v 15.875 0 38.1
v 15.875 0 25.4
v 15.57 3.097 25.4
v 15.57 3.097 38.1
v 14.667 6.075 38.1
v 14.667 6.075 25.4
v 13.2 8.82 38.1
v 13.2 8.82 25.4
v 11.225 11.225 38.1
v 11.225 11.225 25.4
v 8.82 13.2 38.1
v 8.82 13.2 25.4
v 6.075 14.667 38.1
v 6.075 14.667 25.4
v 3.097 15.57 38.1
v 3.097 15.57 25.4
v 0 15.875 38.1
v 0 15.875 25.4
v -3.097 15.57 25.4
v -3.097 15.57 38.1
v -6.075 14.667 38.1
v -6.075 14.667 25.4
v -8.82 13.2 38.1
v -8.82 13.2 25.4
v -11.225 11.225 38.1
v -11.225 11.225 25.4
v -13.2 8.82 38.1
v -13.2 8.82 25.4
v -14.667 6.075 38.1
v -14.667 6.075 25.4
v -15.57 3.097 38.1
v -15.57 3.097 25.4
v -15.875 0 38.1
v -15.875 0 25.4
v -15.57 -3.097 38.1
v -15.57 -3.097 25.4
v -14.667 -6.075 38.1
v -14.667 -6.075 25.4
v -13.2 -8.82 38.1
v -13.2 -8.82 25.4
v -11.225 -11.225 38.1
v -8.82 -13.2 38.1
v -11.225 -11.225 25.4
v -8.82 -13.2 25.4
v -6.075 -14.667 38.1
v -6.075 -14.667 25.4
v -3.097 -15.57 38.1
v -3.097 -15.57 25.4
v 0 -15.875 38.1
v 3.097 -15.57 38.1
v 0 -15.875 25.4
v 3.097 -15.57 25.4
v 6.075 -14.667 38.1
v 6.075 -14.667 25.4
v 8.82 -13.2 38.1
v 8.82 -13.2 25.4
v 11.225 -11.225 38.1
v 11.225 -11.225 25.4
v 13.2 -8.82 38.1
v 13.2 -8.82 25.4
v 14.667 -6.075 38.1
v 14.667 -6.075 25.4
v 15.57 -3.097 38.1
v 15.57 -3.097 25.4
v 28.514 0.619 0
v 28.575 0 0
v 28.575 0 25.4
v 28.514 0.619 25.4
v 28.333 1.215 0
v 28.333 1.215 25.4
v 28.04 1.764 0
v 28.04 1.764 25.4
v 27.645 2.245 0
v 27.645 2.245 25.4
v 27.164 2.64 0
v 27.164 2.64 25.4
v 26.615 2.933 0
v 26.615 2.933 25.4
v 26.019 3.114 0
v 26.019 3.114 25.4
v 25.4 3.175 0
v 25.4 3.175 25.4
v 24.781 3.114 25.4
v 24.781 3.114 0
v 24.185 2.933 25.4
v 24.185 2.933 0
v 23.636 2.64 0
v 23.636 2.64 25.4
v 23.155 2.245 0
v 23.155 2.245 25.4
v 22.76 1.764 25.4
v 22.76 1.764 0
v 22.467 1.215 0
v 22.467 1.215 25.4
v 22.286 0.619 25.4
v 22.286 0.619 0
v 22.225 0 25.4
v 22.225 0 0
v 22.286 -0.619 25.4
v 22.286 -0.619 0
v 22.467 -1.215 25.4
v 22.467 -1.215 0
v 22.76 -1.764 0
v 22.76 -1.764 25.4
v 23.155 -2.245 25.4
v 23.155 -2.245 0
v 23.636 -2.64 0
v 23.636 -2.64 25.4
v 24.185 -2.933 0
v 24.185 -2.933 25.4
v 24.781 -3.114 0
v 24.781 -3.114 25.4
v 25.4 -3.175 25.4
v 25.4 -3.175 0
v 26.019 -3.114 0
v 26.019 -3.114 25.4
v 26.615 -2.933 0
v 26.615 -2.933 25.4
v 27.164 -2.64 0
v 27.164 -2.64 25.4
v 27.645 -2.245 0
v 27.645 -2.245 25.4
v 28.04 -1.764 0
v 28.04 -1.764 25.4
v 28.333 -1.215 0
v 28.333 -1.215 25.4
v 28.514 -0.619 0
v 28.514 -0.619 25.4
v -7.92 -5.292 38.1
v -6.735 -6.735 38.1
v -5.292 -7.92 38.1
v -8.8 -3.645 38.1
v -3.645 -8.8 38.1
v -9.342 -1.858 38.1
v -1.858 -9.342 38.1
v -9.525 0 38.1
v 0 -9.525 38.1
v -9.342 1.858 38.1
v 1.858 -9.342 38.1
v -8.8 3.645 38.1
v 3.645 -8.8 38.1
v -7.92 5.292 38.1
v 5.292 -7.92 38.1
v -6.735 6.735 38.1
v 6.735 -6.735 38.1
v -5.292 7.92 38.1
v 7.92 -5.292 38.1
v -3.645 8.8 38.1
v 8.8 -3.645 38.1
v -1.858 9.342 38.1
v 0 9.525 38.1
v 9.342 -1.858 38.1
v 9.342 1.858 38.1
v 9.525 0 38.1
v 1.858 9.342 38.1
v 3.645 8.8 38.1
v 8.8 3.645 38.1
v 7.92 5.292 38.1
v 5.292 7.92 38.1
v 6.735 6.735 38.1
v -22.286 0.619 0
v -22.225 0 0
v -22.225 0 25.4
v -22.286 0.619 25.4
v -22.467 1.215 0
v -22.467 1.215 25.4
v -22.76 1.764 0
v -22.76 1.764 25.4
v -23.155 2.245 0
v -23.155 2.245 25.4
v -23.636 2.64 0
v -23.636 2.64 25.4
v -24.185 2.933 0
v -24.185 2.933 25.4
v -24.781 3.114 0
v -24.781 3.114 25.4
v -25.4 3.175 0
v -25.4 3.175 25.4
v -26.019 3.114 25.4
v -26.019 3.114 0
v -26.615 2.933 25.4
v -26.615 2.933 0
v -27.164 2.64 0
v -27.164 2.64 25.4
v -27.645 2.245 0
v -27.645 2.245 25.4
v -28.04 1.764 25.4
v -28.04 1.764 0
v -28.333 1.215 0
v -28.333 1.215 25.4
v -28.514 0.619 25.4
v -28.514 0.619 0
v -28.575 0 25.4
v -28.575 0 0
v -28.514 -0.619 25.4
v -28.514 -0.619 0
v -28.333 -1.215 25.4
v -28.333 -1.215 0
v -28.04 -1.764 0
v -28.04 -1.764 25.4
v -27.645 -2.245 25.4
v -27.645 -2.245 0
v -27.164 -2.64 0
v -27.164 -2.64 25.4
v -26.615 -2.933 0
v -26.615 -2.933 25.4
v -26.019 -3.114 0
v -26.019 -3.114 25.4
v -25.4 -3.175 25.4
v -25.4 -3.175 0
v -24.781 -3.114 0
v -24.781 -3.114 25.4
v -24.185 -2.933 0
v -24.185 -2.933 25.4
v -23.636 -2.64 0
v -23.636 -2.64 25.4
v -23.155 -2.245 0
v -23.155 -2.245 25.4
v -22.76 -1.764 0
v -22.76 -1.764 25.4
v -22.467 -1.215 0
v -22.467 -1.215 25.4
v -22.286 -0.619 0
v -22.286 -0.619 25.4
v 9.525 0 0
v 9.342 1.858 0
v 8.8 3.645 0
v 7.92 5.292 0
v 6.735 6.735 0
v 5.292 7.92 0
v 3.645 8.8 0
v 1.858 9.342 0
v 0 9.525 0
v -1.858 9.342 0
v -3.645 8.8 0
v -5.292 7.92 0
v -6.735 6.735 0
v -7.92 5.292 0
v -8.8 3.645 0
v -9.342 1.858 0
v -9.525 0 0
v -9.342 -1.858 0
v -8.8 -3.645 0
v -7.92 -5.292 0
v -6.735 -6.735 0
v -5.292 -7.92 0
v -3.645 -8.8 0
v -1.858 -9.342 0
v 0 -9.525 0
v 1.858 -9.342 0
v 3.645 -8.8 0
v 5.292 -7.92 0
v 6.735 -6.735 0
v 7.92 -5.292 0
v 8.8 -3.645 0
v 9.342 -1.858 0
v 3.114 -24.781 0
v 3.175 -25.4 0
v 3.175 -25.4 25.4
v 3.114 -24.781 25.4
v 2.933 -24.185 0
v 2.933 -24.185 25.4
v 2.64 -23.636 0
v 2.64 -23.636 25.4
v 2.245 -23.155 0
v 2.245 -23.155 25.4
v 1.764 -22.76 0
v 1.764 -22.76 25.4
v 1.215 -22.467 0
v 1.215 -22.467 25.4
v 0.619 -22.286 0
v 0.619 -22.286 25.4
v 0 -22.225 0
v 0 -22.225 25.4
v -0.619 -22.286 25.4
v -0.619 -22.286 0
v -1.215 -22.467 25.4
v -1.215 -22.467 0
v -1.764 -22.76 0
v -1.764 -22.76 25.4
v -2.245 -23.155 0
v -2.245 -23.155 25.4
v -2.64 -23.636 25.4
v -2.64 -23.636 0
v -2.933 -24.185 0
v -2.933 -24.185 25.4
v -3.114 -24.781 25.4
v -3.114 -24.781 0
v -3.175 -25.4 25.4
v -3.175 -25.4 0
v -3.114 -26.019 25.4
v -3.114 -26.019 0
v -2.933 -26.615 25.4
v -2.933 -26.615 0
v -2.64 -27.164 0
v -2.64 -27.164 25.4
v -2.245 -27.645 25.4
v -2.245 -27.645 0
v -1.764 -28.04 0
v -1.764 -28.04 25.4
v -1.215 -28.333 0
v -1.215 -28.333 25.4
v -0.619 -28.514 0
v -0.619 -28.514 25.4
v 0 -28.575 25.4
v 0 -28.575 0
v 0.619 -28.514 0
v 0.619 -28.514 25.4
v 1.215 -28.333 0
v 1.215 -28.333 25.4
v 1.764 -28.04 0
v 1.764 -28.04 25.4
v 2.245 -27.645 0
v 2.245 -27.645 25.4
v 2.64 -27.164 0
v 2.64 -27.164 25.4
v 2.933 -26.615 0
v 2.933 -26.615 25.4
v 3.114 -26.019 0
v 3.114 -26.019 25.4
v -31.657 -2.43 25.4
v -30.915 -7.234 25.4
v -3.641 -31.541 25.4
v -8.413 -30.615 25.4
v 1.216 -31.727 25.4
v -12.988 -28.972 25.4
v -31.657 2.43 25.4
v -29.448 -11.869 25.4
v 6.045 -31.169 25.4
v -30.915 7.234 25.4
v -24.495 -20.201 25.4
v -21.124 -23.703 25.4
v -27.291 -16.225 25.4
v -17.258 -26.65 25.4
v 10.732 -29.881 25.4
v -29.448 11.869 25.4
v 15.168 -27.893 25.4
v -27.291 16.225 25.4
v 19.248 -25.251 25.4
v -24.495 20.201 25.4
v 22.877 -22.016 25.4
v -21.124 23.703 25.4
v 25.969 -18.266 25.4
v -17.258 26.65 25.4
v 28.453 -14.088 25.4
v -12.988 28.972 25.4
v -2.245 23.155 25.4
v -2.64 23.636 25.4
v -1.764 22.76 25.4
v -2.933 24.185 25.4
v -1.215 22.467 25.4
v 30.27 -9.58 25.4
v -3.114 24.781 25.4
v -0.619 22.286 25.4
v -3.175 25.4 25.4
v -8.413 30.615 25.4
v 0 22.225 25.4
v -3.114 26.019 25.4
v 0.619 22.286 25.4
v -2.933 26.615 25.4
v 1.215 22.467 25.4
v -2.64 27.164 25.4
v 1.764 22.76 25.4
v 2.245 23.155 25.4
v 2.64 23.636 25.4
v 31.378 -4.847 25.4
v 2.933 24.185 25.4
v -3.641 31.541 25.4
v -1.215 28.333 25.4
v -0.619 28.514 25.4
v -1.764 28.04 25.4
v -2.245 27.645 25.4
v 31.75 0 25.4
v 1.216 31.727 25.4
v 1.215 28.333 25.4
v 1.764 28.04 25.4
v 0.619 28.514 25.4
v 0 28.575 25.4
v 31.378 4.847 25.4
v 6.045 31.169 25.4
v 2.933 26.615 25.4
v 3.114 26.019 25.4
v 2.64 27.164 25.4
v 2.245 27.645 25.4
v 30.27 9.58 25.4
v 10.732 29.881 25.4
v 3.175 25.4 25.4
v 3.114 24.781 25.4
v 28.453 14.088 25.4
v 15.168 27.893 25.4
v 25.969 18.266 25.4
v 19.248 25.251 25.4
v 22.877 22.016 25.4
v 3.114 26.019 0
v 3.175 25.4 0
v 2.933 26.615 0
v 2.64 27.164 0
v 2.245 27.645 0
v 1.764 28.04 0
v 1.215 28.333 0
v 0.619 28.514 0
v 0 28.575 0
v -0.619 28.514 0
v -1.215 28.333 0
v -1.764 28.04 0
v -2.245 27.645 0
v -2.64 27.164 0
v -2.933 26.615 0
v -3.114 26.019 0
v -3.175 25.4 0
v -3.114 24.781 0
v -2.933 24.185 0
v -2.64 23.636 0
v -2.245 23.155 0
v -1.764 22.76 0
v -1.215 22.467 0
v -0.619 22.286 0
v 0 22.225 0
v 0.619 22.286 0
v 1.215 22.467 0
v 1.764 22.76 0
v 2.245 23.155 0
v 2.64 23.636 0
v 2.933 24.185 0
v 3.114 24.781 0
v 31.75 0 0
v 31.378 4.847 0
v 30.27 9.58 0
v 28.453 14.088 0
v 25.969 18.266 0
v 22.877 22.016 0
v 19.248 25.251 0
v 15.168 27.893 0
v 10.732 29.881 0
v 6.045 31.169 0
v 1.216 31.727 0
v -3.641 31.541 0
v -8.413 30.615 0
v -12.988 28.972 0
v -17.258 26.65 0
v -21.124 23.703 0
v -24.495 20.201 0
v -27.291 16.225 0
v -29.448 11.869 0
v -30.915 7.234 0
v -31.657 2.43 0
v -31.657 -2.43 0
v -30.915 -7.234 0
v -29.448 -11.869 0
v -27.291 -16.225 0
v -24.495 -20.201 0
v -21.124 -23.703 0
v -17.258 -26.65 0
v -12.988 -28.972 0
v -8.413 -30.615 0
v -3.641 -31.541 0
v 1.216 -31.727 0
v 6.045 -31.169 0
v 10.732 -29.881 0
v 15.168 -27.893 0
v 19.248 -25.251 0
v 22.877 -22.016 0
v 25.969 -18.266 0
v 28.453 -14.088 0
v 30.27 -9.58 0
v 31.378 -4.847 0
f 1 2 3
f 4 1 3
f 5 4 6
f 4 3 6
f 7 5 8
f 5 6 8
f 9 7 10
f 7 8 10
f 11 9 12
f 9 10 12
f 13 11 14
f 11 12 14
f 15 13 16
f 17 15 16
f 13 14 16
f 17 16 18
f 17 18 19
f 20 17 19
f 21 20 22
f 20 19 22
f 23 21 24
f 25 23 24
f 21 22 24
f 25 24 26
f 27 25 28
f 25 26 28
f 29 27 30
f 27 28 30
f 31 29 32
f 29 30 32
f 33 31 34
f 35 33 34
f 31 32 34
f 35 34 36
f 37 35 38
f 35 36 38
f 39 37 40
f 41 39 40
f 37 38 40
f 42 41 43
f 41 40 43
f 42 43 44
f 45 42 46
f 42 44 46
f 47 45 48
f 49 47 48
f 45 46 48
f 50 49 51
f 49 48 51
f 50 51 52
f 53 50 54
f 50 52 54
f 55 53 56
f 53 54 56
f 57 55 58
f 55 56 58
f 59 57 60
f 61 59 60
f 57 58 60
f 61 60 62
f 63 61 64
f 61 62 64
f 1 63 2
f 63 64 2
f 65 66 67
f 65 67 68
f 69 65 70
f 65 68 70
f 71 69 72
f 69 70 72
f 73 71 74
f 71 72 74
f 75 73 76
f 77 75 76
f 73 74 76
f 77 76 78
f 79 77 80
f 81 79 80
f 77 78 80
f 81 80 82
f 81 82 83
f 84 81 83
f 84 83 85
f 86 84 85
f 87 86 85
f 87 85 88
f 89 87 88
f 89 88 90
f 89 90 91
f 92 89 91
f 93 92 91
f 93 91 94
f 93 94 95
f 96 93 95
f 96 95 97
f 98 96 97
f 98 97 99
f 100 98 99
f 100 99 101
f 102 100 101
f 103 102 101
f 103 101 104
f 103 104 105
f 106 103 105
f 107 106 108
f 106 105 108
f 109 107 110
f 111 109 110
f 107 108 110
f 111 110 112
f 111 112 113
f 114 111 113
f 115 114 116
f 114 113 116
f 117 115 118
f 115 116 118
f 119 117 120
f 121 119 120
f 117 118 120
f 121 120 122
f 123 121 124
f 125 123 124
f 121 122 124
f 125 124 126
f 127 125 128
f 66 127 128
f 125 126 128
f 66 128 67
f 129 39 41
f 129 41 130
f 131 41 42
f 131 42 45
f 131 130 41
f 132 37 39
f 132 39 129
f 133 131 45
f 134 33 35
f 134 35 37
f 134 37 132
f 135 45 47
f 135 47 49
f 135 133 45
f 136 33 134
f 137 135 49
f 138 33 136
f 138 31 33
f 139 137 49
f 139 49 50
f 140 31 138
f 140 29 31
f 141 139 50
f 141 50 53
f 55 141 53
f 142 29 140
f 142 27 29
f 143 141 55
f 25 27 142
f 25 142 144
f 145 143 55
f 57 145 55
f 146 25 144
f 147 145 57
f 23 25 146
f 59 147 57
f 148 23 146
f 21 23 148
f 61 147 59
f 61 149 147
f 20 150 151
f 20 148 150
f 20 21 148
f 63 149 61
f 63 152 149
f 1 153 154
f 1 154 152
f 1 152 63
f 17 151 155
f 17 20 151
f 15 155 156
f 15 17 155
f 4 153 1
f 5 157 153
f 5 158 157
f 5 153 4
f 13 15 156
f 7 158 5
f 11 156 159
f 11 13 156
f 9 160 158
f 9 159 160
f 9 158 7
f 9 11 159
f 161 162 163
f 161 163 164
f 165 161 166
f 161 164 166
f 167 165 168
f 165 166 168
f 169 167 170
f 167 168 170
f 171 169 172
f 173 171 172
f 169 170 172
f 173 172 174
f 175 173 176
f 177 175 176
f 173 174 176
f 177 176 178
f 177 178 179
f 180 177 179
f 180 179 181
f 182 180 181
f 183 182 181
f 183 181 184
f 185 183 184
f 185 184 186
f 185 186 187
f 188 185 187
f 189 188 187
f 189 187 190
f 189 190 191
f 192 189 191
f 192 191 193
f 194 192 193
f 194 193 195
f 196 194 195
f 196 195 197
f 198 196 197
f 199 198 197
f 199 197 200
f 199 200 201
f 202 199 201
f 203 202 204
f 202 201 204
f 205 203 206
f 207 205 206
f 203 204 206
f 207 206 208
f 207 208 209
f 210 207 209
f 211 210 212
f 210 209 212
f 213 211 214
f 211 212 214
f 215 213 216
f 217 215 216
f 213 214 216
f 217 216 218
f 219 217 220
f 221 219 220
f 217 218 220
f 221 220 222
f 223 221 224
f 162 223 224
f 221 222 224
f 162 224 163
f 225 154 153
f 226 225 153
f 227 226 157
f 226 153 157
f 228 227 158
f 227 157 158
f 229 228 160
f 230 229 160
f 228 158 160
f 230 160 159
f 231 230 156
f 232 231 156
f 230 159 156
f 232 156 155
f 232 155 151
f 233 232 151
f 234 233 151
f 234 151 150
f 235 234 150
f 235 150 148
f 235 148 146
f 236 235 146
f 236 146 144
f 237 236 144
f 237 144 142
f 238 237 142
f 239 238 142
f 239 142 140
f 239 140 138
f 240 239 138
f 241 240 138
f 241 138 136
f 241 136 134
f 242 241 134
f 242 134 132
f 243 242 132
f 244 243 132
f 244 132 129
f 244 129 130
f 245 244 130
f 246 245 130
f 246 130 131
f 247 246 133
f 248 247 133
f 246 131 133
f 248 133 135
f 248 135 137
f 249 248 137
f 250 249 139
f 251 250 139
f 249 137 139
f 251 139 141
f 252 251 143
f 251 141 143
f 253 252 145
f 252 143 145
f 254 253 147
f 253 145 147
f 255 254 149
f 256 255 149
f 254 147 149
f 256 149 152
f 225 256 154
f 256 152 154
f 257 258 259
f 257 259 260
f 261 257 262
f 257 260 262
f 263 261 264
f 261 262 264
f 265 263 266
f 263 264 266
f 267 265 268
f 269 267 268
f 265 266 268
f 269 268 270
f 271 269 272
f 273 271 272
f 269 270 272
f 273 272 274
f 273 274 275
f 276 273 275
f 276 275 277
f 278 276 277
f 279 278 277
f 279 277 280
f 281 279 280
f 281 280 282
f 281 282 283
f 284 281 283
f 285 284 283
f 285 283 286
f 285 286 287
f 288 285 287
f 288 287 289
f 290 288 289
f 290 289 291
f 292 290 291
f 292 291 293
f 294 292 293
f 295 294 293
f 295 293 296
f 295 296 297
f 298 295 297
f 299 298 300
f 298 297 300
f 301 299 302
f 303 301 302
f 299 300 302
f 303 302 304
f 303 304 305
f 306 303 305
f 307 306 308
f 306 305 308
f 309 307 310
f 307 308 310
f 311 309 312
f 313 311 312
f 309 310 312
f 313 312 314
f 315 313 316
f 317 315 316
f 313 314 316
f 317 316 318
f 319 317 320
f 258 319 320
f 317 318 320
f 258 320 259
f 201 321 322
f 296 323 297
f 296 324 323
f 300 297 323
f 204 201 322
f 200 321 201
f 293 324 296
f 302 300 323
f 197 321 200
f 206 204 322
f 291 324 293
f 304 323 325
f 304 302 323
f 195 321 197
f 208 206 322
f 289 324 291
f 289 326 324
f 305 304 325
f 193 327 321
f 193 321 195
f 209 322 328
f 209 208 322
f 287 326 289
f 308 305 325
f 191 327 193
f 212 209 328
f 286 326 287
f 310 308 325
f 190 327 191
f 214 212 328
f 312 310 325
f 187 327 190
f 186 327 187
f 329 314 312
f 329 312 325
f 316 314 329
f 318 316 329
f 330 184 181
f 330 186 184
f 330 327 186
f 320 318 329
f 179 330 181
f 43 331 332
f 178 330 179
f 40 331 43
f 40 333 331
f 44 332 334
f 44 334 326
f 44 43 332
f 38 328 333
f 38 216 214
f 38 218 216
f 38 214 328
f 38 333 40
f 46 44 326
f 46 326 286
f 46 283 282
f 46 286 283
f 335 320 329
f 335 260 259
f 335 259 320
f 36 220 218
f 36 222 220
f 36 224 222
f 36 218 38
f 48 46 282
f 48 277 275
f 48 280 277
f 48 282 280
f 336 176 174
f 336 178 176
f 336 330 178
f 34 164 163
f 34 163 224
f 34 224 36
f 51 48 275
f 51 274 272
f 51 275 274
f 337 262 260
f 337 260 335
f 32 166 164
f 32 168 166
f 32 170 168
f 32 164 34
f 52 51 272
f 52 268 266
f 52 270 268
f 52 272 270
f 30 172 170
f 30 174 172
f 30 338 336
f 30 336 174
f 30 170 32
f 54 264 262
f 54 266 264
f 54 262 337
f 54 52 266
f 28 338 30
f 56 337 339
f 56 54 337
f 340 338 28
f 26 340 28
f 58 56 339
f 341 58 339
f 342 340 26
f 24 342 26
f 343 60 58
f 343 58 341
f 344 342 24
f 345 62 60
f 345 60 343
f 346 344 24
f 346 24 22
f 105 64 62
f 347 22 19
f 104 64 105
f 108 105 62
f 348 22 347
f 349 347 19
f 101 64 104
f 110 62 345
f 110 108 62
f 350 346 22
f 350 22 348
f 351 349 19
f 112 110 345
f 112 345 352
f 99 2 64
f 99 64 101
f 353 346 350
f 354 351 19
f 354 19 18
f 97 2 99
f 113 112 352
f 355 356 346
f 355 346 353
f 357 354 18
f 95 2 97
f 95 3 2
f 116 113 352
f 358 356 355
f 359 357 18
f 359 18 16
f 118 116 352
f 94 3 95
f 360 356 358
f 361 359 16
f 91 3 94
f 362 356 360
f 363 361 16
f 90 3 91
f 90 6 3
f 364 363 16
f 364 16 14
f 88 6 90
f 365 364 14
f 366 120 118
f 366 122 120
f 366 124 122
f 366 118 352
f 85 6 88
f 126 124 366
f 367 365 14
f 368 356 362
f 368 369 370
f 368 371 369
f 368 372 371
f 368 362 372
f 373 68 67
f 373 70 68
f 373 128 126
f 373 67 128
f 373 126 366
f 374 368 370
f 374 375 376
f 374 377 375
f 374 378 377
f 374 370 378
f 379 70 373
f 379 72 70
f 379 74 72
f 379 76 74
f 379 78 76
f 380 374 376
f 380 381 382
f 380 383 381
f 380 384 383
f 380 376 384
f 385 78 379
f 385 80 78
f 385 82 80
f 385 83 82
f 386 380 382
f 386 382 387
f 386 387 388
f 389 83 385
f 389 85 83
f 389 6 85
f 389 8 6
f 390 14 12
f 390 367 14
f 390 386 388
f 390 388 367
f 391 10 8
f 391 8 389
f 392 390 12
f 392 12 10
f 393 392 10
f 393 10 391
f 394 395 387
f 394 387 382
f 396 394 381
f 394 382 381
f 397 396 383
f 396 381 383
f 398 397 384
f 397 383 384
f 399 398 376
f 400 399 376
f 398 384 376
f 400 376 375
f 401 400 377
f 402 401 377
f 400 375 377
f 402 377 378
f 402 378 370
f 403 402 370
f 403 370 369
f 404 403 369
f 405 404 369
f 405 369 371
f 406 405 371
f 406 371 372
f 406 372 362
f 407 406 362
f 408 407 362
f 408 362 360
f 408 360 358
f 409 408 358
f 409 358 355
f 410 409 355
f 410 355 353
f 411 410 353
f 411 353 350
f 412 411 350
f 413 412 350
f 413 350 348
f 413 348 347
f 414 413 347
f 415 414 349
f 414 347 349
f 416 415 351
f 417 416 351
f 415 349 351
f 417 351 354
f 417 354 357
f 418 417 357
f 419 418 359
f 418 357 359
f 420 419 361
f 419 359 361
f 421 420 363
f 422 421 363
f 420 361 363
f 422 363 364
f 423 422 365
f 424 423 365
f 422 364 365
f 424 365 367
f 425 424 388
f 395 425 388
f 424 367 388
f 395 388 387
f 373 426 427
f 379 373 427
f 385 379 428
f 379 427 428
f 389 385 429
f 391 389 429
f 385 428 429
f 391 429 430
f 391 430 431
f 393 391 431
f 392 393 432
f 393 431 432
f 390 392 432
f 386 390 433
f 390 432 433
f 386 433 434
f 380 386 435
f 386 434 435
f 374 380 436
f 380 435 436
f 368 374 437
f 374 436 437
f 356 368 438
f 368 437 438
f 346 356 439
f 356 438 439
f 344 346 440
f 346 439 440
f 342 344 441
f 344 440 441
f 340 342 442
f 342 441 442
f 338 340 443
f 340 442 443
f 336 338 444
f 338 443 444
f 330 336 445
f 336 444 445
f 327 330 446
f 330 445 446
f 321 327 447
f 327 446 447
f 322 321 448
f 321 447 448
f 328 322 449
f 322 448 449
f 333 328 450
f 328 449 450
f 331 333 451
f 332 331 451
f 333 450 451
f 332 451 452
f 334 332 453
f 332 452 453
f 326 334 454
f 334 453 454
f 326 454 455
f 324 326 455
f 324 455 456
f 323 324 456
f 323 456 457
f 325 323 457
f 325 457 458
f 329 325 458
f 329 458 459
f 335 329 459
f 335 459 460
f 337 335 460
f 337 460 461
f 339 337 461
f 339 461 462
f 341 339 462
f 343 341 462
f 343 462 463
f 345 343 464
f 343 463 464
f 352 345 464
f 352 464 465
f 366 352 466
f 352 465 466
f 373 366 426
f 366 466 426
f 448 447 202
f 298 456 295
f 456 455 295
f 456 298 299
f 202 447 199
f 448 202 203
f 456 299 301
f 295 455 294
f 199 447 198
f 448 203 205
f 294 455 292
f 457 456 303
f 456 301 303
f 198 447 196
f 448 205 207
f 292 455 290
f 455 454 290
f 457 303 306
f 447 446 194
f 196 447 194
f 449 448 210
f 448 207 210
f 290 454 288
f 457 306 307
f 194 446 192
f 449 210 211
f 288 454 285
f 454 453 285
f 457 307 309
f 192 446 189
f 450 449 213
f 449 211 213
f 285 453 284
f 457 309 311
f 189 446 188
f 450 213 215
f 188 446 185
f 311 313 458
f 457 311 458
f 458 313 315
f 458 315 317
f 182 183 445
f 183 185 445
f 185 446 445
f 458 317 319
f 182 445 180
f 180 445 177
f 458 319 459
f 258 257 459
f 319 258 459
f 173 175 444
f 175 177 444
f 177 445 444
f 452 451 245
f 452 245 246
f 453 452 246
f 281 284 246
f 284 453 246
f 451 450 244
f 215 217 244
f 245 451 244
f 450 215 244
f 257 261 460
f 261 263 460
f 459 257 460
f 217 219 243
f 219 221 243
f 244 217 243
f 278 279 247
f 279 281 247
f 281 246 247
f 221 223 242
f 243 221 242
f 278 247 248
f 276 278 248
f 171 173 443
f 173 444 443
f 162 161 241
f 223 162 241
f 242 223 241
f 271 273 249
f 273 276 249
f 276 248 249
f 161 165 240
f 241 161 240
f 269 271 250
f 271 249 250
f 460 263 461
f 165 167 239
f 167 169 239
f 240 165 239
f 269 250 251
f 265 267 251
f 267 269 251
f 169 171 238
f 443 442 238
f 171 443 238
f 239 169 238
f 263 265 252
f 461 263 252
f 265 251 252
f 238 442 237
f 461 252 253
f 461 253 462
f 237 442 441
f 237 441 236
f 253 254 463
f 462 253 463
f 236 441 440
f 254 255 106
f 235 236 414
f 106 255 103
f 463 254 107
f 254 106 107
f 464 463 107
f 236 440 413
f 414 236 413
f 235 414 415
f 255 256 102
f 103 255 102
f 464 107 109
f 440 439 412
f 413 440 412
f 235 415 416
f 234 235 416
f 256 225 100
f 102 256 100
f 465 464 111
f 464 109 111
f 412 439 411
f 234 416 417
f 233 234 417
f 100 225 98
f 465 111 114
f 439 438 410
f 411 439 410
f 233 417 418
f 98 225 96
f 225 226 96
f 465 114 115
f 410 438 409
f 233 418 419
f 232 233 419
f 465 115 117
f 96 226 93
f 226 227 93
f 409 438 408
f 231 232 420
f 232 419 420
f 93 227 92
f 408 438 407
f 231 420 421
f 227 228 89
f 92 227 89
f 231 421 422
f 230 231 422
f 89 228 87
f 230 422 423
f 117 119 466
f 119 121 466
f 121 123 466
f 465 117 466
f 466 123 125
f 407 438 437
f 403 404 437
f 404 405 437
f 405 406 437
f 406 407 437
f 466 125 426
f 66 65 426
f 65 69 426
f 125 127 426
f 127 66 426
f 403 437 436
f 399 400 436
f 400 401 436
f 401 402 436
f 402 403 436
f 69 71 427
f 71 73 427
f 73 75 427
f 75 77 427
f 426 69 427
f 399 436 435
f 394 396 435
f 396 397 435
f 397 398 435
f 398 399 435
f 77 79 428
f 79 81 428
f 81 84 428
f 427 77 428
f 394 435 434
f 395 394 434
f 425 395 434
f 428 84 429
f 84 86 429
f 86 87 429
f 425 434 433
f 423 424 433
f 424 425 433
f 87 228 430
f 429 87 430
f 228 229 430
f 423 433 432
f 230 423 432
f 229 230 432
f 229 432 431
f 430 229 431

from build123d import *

# Parameters (mm, degrees)
F0_R     = 31.75
F1_DEPTH = 25.4
F2_R     = 15.875
F3_DEPTH = 12.7
F4_R     = 9.525
F5_DEPTH = 38.101
F6_R     = 3.175
F7_DEPTH = 25.401


with BuildPart() as f1:
    # F0 (on Top) → F1 (new body)
    with BuildSketch(Plane.XY):
        Circle(F0_R)
    extrude(amount=F1_DEPTH)

    # F2 (on face) → F3 (join)
    with BuildSketch(Plane.XY.offset(25.4)):
        Circle(F2_R)
    extrude(amount=F3_DEPTH)

    # F4 (on face) → F5 (cut, through all)
    with BuildSketch(Plane.XY.offset(38.1)):
        Circle(F4_R)
    extrude(amount=-F5_DEPTH, mode=Mode.SUBTRACT)

    # F6 (on face) → F7 (cut, through all)
    with BuildSketch(Plane.XY.offset(25.4)):
        with Locations((0, 25.4)):
            Circle(F6_R)
        with Locations((-25.4, 0)):
            Circle(F6_R)
        with Locations((0, -25.4)):
            Circle(F6_R)
        with Locations((25.4, 0)):
            Circle(F6_R)
    extrude(amount=-F7_DEPTH, mode=Mode.SUBTRACT)


solid = f1.part
